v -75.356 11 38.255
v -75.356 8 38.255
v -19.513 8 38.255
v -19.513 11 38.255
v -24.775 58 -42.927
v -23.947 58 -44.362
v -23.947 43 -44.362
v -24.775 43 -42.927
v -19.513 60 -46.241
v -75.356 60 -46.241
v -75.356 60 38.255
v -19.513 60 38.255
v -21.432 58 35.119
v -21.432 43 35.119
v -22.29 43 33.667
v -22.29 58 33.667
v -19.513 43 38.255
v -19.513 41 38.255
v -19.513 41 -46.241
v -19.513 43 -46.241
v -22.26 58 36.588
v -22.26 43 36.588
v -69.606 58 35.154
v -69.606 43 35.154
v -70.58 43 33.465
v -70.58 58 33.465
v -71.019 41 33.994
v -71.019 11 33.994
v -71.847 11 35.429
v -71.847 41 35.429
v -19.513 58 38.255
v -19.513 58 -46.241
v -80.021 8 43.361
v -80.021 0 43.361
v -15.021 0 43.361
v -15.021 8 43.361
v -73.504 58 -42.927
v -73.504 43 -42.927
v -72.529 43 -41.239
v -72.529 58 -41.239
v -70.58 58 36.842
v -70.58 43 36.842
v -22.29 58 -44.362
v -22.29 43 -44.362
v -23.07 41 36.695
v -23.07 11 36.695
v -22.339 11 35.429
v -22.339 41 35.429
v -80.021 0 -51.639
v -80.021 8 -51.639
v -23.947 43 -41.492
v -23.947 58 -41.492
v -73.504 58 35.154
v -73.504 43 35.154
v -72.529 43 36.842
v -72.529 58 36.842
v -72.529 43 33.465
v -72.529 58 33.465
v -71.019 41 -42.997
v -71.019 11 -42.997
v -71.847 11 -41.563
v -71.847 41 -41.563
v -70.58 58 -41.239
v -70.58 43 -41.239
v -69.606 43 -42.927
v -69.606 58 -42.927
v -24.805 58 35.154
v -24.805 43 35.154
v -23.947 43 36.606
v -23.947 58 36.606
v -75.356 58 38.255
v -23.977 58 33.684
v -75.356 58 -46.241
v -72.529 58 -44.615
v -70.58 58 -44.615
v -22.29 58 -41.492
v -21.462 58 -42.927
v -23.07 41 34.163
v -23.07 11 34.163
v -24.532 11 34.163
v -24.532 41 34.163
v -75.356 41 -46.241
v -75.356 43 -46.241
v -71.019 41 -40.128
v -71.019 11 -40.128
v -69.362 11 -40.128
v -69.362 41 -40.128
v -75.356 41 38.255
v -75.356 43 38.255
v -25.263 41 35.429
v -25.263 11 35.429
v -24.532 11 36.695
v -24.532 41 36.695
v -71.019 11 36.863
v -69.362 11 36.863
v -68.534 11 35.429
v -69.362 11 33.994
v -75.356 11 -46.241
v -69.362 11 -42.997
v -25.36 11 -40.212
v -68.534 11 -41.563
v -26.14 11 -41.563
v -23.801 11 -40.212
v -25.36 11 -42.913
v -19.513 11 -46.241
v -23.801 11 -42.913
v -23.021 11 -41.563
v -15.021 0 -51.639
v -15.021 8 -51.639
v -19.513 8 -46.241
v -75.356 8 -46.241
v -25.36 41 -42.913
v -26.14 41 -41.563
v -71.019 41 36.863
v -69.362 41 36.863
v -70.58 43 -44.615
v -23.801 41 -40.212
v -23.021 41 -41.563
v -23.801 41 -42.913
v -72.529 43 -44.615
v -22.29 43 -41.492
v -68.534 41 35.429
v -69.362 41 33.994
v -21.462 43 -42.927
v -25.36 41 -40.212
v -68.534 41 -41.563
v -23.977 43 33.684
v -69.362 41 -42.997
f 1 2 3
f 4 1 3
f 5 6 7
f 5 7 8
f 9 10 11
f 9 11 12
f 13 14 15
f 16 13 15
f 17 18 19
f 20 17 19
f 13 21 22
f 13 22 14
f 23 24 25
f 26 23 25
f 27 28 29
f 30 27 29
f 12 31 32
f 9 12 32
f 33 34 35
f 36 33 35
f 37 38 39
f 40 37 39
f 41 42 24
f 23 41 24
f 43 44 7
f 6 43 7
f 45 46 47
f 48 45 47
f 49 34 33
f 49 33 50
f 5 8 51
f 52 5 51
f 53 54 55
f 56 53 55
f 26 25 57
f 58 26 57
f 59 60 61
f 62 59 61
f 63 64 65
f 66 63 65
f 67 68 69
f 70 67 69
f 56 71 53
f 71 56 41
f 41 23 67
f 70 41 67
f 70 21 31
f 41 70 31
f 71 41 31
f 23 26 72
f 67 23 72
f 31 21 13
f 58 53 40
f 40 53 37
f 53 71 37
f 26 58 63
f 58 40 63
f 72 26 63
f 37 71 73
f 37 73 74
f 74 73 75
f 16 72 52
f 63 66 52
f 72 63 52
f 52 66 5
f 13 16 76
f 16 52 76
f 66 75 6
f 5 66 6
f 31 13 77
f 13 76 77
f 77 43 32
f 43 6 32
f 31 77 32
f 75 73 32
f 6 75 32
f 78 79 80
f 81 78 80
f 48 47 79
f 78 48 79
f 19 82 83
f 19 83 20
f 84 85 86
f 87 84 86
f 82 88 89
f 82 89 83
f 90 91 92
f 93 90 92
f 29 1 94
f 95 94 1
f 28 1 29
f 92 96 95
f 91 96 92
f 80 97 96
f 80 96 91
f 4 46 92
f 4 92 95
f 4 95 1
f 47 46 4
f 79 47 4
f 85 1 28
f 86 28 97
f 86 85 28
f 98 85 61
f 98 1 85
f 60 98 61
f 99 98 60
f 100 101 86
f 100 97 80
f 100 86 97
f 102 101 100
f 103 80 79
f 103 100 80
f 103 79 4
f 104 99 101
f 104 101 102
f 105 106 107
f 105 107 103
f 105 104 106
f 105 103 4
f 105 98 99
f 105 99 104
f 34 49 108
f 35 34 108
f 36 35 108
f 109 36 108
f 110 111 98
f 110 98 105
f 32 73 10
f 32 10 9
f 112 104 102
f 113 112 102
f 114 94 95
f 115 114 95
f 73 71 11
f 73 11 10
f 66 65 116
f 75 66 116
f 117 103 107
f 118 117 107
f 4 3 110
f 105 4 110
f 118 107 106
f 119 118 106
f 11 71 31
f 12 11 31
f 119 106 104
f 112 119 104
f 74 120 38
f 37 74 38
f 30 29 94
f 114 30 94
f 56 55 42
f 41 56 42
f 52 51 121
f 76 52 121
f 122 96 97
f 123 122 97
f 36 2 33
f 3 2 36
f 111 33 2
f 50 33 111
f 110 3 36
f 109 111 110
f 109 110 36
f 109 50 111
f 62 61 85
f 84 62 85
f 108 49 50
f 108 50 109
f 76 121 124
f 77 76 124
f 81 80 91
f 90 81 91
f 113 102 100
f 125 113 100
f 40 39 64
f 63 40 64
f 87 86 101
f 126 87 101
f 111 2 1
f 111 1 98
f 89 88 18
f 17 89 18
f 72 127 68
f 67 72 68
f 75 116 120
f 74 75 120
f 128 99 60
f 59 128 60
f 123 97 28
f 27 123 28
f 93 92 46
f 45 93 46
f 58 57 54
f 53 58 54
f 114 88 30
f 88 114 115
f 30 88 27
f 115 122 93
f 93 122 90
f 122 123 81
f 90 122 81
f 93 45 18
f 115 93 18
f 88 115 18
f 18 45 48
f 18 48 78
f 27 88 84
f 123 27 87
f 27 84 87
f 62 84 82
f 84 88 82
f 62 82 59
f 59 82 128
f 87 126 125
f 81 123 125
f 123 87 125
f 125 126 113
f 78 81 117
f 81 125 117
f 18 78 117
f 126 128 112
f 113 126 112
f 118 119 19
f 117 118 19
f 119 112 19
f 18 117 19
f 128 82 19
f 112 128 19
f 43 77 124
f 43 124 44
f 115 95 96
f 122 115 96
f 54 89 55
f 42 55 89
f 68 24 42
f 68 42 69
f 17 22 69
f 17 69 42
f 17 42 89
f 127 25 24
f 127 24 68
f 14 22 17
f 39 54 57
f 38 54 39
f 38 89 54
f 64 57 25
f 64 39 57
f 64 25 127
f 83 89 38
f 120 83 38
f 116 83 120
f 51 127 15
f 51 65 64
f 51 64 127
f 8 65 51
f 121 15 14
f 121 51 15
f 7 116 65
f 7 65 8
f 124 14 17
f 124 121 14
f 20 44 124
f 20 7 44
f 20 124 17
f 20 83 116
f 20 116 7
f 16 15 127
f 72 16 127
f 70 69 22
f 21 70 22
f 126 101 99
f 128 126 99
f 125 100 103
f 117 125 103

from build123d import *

# Parameters (mm, degrees)
SKETCH1_W           = 65
SKETCH1_H           = 95
BOSS_EXTRUDE1_DEPTH = 8
SKETCH2_W           = 55.842972677
SKETCH2_H           = 84.495387978
BOSS_EXTRUDE2_DEPTH = 3
BOSS_EXTRUDE3_DEPTH = 30
SKETCH4_W           = 55.842972677
SKETCH4_H           = 84.495387978
BOSS_EXTRUDE4_DEPTH = 2
BOSS_EXTRUDE5_DEPTH = 15
SKETCH6_W           = 55.842972677
SKETCH6_H           = 84.495387978
BOSS_EXTRUDE6_DEPTH = 2


with BuildPart() as part:
    # Sketch1 → Boss-Extrude1 (new body)
    with BuildSketch(Plane(origin=(0, 0, 0), x_dir=(1, 0, 0), z_dir=(0, 1, 0))):
        with Locations((-47.520746888, 4.139004149)):
            Rectangle(SKETCH1_W, SKETCH1_H)
    extrude(amount=BOSS_EXTRUDE1_DEPTH)

    # Sketch2 → Boss-Extrude2 (add)
    with BuildSketch(Plane(origin=(0, 8, 0), x_dir=(1, 0, 0), z_dir=(0, 1, 0))):
        with Locations((-47.434076541, 3.992818357)):
            Rectangle(SKETCH2_W, SKETCH2_H)
    extrude(amount=BOSS_EXTRUDE2_DEPTH)

    # Sketch3 → Boss-Extrude3 (add)
    with BuildSketch(Plane(origin=(0, 11, 0), x_dir=(1, 0, 0), z_dir=(0, 1, 0))):
        Polygon((-68.533559236, 41.562566991), (-69.361945393, 42.997373903), (-71.018717706, 42.997373903), (-71.847103863, 41.562566991), (-71.018717706, 40.127760079), (-69.361945393, 40.127760079), align=None)
        Polygon((-23.021049218, 41.562566991), (-23.800706777, 42.912973496), (-25.360021896, 42.912973496), (-26.139679455, 41.562566991), (-25.360021896, 40.212160486), (-23.800706777, 40.212160486), align=None)
        Polygon((-22.338848854, -35.42861698), (-23.069777816, -34.162610881), (-24.531635739, -34.162610881), (-25.262564701, -35.42861698), (-24.531635739, -36.694623078), (-23.069777816, -36.694623078), align=None)
        Polygon((-68.533559236, -35.42861698), (-69.361945393, -33.993810068), (-71.018717706, -33.993810068), (-71.847103863, -35.42861698), (-71.018717706, -36.863423892), (-69.361945393, -36.863423892), align=None)
    extrude(amount=BOSS_EXTRUDE3_DEPTH)

    # Sketch4 → Boss-Extrude4 (add)
    with BuildSketch(Plane(origin=(0, 41, 0), x_dir=(1, 0, 0), z_dir=(0, 1, 0))):
        with Locations((-47.434076541, 3.992818357)):
            Rectangle(SKETCH4_W, SKETCH4_H)
    extrude(amount=BOSS_EXTRUDE4_DEPTH)

    # Sketch5 → Boss-Extrude5 (add)
    with BuildSketch(Plane(origin=(0, 43, 0), x_dir=(1, 0, 0), z_dir=(0, 1, 0))):
        Polygon((-69.60558838, 42.92696772), (-70.580160329, 44.614975851), (-72.529304227, 44.614975851), (-73.503876176, 42.92696772), (-72.529304227, 41.238959588), (-70.580160329, 41.238959588), align=None)
        Polygon((-21.4617341, 42.92696772), (-22.290120256, 44.361774631), (-23.94689257, 44.361774631), (-24.775278726, 42.92696772), (-23.94689257, 41.492160808), (-22.290120256, 41.492160808), align=None)
        Polygon((-22.290120256, -33.666923337), (-23.976783563, -33.68418091), (-24.80516972, -35.153502968), (-23.94689257, -36.605567453), (-22.260229263, -36.58830988), (-21.431843106, -35.118987822), align=None)
        Polygon((-69.60558838, -35.153502968), (-70.580160329, -33.465494837), (-72.529304227, -33.465494837), (-73.503876176, -35.153502968), (-72.529304227, -36.8415111), (-70.580160329, -36.8415111), align=None)
    extrude(amount=BOSS_EXTRUDE5_DEPTH)

    # Sketch6 → Boss-Extrude6 (add)
    with BuildSketch(Plane(origin=(0, 58, 0), x_dir=(1, 0, 0), z_dir=(0, 1, 0))):
        with Locations((-47.434076541, 3.992818357)):
            Rectangle(SKETCH6_W, SKETCH6_H)
    extrude(amount=BOSS_EXTRUDE6_DEPTH)


solid = part.part
